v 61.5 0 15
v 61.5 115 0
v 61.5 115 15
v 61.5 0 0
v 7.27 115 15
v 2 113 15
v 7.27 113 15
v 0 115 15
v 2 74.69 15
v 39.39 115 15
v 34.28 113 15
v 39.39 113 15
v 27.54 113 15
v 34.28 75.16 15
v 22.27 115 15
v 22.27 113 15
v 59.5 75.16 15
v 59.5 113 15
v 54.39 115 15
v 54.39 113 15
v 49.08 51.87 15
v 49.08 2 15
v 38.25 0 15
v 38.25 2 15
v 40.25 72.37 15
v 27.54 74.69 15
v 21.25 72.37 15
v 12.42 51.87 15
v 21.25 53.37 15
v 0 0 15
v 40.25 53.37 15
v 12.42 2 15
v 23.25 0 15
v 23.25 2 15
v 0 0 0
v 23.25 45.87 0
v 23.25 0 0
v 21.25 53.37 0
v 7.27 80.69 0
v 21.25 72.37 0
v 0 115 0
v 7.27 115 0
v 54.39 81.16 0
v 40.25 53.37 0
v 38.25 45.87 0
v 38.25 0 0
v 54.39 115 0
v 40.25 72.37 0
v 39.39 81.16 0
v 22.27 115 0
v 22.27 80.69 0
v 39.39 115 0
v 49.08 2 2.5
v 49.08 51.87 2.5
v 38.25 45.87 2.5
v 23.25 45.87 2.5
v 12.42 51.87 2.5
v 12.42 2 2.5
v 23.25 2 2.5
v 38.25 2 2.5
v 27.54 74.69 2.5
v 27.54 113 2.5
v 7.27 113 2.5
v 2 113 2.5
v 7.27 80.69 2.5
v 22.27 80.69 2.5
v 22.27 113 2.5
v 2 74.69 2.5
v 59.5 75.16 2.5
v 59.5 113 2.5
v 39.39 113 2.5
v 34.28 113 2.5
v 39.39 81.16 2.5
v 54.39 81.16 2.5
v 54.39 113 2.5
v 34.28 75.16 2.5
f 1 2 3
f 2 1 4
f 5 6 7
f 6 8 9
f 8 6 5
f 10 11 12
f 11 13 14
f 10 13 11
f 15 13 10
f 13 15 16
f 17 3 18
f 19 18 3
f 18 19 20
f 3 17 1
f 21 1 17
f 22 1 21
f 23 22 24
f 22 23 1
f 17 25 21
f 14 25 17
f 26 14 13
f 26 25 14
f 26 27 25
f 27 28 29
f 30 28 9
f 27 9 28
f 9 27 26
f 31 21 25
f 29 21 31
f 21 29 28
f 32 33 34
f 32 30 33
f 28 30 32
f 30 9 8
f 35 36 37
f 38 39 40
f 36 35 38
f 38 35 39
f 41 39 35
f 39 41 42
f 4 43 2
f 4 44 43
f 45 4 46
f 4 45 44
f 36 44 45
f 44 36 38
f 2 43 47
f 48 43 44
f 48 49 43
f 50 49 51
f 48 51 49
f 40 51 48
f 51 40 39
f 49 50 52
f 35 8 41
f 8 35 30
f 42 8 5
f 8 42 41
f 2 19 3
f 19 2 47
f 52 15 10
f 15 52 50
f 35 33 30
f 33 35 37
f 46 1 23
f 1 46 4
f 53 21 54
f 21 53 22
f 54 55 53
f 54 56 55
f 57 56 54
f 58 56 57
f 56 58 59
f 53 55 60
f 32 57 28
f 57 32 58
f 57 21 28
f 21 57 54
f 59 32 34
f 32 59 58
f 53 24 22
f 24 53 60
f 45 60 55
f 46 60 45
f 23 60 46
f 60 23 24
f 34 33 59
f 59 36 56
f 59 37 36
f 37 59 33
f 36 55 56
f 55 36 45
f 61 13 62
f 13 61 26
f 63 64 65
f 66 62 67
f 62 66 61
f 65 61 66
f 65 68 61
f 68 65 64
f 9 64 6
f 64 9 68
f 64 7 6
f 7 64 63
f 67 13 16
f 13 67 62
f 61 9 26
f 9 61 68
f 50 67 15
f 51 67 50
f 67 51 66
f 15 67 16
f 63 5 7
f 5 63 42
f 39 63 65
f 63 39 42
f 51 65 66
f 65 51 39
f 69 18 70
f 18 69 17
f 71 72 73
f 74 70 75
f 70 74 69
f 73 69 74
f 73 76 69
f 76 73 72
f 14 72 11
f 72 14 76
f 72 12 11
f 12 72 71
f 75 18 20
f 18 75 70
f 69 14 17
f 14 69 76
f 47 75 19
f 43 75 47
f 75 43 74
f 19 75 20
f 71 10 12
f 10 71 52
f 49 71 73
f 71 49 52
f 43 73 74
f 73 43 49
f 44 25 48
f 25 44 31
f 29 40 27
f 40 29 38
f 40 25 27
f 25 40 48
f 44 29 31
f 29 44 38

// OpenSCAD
length = 61.5;
width = 115;
height = 15;

//Based on magnet size:
magnetBaseInnerDiameter = 19;
magnetHeight = 4.0;

//inox archer x 6, 49.37 x 36.16, base 24.49
//bandit archer x 6, 37.31 x 24.54, base fullish
//city archer x 6, 36.84 x 24.22, base 22.97
//single token 2.0
magnetOffset = 49.37;
largeTokenWidth = 49.37 + .5;
largeTokenLength = 36.16 + .5;
largeTokenHeight = 12 + .5;
largeTokenSquareLipWidthRemainder = largeTokenLength - 15;
largeTokenSquareLipLengthRemainder = 4;

smallToken1Width = 37.31 + 1;
smallToken1Length = 24.54 + 1;
smallToken1Height = 12 + .5;
smallToken1SquareLipWidthRemainder = smallToken1Length - 15;
smallToken1SquareLipLengthRemainder = 4;

smallToken2Width = 36.84 + 1;
smallToken2Length = 24.22 + 1;
smallToken2Height = 12 + .5;
smallToken2SquareLipWidthRemainder = smallToken2Length - 15;
smallToken2SquareLipLengthRemainder = 4;

spaceBetweenCircles = 2;
wallThickness = spaceBetweenCircles;



difference(){
    cube([length, width, height]);


//----------------------------------
translate(
        [
            length/2 - largeTokenLength/2,
            wallThickness,
            height - largeTokenHeight
        ])
        cube([largeTokenLength,largeTokenWidth, largeTokenHeight]);
    translate([
        length/2 - (largeTokenLength - largeTokenSquareLipWidthRemainder)/2,
        0,
        0])
        cube([
            largeTokenLength - largeTokenSquareLipWidthRemainder,
            largeTokenWidth - largeTokenSquareLipLengthRemainder,
            height]);

            
//---------------------------------------------------------------------
    
    translate(
        [
            wallThickness,
            width - (wallThickness + smallToken1Width),
            height - smallToken1Height
        ])
        cube([smallToken1Length,smallToken1Width, smallToken1Height]);
    translate([
        wallThickness + smallToken1SquareLipWidthRemainder/2,
        width - (smallToken1Width - smallToken1SquareLipLengthRemainder),
        0])
        cube([
            smallToken1Length - smallToken1SquareLipWidthRemainder,
            smallToken1Width - smallToken1SquareLipLengthRemainder,
            height]);

    translate(
        [
            length - (wallThickness + smallToken2Length),
            width - (wallThickness + smallToken2Width),
            height - smallToken2Height
        ])
        cube([smallToken2Length,smallToken2Width, smallToken2Height]);
    translate([
        length - (wallThickness + smallToken2Length) + smallToken2SquareLipWidthRemainder/2,
        width - (smallToken2Width - smallToken2SquareLipLengthRemainder),
        0])
        cube([
            smallToken2Length - smallToken2SquareLipWidthRemainder,
            smallToken2Width - smallToken2SquareLipLengthRemainder,
            height]);       

//----------------------------------------
   
    translate([length/2 - magnetBaseInnerDiameter/2, magnetOffset + wallThickness * 2, 0])
        cube([magnetBaseInnerDiameter, magnetBaseInnerDiameter, height]);
        

}
